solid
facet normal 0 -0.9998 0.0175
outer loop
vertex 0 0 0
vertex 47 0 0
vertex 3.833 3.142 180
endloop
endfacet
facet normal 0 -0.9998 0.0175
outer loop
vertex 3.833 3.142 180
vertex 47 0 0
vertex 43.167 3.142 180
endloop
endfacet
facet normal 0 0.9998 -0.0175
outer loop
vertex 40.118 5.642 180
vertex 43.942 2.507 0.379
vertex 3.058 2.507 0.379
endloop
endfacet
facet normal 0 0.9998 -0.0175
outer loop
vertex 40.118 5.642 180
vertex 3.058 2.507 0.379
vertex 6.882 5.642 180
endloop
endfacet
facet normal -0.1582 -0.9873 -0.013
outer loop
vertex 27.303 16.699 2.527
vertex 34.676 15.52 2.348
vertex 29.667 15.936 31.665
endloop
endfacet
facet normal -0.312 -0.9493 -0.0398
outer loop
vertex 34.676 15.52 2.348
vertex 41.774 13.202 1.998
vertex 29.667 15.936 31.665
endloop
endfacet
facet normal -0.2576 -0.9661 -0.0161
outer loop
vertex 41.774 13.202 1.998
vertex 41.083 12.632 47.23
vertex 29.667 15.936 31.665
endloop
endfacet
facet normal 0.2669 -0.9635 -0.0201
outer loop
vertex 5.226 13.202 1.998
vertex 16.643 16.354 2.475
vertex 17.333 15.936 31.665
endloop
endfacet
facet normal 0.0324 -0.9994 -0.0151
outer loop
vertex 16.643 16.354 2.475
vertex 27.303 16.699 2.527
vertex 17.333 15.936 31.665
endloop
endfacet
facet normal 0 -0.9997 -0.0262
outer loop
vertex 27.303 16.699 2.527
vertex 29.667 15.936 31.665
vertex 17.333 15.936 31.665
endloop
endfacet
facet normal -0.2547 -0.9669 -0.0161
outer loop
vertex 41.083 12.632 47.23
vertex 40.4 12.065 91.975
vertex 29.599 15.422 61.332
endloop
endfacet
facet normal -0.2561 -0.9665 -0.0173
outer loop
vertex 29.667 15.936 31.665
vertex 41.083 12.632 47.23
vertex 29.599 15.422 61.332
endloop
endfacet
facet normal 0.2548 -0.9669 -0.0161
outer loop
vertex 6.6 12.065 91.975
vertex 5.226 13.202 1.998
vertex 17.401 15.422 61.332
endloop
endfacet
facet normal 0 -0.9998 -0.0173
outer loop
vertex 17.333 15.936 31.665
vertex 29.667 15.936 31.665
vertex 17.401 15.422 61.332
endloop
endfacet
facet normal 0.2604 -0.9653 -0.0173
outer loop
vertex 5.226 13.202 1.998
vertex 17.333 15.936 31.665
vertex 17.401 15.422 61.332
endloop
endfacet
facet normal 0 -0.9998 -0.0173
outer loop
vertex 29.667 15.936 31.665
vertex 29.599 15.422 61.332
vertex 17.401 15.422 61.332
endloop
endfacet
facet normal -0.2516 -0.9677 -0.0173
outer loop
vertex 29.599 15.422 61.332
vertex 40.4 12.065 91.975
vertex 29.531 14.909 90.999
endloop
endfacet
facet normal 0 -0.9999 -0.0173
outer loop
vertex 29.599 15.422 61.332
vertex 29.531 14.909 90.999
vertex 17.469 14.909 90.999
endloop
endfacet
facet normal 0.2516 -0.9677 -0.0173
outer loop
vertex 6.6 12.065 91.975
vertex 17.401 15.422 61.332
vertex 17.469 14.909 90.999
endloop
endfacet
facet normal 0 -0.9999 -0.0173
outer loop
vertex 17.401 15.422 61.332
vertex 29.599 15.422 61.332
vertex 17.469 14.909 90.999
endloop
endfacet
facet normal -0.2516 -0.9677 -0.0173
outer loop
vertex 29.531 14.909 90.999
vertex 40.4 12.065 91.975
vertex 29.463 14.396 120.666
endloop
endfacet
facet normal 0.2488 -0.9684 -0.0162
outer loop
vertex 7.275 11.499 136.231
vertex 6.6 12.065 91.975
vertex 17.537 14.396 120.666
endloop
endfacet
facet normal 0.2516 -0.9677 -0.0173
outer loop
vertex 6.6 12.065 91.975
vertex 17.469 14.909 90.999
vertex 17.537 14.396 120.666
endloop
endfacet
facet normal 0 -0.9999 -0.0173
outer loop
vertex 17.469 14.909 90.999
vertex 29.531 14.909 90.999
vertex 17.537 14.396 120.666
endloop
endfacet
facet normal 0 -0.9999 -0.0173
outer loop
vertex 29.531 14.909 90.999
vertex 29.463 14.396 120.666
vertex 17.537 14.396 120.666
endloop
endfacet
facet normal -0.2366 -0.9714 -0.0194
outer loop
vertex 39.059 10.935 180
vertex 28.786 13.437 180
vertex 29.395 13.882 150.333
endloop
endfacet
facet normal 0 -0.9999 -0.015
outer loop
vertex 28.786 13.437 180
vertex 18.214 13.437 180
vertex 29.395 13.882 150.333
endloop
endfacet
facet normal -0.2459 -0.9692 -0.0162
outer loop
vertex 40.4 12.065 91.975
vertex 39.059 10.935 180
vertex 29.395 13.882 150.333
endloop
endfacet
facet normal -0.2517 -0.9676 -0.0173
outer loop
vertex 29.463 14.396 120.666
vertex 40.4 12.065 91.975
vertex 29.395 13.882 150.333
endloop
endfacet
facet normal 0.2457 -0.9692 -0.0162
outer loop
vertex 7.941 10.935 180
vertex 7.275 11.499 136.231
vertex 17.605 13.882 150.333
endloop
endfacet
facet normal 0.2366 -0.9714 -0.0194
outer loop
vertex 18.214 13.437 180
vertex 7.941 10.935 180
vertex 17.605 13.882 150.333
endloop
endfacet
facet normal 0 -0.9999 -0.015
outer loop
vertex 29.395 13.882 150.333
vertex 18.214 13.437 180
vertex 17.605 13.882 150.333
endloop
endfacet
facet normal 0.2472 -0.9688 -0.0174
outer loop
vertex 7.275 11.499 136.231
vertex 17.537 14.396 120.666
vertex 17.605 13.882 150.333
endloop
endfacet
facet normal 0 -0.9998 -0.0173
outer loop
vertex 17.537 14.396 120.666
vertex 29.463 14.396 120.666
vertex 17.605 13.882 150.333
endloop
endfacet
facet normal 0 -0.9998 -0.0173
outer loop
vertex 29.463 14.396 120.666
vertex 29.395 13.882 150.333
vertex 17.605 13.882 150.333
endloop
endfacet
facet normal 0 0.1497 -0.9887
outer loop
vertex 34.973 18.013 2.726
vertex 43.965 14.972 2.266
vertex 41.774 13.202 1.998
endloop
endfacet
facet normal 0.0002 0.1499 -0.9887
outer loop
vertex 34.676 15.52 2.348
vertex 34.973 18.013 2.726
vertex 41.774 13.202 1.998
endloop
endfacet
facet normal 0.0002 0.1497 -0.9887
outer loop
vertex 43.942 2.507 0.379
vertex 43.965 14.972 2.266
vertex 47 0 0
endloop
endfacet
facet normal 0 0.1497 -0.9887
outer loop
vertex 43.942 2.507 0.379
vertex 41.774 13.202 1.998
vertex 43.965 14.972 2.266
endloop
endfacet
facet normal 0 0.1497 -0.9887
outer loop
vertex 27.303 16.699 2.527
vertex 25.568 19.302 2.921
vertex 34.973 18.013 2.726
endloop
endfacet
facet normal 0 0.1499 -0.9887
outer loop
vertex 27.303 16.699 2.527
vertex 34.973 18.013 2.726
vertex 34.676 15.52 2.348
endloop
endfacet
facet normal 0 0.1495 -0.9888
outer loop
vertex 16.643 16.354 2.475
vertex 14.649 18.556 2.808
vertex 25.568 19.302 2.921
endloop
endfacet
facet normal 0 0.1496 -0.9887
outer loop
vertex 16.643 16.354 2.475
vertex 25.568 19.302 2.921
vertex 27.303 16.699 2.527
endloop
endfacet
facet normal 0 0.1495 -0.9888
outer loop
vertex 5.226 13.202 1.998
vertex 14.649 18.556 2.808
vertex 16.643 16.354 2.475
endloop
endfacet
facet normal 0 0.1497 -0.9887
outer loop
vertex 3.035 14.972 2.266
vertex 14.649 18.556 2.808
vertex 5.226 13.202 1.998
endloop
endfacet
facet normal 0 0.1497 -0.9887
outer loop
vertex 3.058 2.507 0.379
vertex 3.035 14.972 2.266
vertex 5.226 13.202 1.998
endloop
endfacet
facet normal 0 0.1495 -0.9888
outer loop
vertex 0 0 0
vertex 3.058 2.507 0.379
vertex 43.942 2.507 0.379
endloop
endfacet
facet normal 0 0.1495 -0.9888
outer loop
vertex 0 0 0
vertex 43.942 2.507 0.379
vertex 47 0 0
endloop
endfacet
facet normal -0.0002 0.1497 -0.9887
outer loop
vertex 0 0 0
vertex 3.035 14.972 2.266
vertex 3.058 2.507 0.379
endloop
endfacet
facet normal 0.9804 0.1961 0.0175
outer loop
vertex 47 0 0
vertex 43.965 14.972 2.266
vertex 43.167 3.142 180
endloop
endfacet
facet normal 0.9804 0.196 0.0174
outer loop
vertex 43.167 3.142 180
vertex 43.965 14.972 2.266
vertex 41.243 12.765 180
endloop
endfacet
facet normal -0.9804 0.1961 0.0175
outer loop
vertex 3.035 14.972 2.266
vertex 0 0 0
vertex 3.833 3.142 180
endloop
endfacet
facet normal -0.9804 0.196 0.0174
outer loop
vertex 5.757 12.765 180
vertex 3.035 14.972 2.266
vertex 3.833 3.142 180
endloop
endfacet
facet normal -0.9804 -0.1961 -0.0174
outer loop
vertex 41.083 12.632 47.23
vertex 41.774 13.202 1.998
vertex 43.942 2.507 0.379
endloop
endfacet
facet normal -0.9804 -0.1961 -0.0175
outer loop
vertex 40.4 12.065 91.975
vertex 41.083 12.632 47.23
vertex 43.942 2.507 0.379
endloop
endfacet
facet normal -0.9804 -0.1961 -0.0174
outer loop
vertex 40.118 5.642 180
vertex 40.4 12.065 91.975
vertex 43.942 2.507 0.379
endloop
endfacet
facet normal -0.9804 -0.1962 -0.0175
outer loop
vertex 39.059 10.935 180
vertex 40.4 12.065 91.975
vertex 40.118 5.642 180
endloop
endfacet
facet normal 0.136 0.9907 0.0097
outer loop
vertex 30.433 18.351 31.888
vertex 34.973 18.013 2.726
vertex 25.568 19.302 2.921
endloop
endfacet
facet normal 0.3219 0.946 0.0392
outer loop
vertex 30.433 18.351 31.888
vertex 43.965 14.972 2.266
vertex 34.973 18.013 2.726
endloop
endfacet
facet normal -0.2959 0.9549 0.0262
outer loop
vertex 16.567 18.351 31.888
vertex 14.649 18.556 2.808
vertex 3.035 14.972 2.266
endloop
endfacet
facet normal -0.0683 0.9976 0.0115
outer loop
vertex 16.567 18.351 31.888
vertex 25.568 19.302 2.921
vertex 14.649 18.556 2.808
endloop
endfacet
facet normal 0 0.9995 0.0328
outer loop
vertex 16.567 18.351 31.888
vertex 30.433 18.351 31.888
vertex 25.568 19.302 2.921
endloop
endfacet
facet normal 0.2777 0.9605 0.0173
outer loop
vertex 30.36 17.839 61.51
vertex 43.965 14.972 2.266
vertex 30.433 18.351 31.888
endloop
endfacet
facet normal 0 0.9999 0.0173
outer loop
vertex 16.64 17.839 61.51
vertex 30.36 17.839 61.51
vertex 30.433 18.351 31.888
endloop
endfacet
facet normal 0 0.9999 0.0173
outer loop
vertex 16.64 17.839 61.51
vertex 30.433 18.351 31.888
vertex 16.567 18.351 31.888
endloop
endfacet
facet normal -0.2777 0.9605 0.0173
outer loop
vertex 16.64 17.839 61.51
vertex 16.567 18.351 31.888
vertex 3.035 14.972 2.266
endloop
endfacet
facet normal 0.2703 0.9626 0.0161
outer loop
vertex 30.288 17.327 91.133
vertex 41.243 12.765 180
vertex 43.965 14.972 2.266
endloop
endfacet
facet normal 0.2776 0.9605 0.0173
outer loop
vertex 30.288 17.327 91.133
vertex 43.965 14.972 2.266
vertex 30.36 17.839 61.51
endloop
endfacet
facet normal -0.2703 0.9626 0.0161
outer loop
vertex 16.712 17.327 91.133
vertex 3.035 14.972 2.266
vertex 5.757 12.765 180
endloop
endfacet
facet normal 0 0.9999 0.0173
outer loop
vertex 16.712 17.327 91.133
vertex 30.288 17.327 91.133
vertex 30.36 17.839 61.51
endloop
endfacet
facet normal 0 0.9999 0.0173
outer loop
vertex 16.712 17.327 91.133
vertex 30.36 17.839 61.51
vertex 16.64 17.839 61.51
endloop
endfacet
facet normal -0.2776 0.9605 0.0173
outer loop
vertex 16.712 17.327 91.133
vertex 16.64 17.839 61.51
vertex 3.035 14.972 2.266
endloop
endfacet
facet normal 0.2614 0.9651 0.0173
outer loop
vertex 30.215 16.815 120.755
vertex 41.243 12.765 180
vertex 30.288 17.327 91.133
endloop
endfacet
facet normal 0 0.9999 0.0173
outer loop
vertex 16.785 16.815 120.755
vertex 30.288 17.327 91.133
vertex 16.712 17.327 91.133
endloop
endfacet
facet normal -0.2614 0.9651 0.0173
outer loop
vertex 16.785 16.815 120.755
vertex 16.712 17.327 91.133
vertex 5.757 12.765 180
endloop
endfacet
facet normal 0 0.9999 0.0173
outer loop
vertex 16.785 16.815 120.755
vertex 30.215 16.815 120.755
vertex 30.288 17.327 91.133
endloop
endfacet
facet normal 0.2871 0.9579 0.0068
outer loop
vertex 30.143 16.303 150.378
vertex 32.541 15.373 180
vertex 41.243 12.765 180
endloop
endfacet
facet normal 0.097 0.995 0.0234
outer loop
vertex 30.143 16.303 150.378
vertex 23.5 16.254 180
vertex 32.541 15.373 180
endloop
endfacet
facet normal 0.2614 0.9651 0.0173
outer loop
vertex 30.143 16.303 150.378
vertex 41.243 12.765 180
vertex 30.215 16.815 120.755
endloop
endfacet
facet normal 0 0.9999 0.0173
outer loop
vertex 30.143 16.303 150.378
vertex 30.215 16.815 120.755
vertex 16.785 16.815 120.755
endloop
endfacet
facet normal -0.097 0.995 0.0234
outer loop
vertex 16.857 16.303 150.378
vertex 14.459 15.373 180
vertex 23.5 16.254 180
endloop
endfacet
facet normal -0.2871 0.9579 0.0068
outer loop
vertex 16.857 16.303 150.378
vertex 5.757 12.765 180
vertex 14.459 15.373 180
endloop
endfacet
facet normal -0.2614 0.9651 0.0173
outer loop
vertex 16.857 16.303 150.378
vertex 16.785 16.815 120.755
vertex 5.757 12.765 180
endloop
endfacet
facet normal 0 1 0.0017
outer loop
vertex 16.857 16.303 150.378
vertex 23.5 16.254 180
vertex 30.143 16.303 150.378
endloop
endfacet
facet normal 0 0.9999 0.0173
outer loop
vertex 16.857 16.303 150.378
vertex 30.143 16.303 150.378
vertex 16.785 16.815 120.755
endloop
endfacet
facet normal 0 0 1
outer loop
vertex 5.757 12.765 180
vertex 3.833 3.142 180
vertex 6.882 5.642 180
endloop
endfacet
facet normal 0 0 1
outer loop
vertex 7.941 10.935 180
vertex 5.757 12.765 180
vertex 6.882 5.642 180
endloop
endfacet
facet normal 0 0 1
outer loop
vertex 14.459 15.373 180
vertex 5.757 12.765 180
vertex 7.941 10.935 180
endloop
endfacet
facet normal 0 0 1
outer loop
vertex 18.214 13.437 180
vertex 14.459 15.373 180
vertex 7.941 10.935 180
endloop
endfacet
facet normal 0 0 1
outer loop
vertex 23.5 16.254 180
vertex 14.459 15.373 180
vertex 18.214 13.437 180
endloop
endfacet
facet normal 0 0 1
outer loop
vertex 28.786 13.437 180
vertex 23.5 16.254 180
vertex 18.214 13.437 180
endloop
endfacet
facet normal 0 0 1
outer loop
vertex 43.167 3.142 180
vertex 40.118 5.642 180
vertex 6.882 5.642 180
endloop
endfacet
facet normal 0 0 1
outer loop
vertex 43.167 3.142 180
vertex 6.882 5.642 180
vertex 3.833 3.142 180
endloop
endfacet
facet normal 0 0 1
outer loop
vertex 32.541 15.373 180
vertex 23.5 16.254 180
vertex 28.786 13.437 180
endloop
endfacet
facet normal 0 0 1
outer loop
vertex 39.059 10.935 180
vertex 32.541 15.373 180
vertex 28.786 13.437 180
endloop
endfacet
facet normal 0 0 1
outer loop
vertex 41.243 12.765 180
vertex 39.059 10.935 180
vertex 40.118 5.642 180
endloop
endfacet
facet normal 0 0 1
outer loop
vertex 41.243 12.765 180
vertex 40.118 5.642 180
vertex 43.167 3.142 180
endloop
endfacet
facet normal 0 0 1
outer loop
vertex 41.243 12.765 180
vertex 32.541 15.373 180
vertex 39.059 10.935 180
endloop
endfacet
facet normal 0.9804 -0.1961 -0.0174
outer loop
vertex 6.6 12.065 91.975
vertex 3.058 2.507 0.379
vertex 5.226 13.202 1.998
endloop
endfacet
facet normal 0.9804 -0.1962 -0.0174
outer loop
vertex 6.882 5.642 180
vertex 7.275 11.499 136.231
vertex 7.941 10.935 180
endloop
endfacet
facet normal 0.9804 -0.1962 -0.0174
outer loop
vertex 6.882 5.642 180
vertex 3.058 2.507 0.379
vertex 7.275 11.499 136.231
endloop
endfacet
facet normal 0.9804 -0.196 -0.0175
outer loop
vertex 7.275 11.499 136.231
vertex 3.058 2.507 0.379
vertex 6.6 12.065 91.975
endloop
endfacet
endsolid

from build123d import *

# Parameters (mm, degrees)
F0_DEPTH = 180
F0_TAPER = 1
F2_DEPTH = 100
F4_T     = -2.5


with BuildPart() as f0:
    # F3 (on Top) → F0 (new body)
    with BuildSketch(Plane.XY):
        with BuildLine():
            Line((3, 15), (0, 0))
            Line((0, 0), (47, 0))
            Line((47, 0), (44, 15))
            ThreePointArc((44, 15), (23.5, 19.3957238847), (3, 15))
        make_face()
    extrude(amount=F0_DEPTH, taper=F0_TAPER)

    # F1 (on Right) → F2 (cut)
    with BuildSketch(Plane.YZ):
        Polygon((25.968901813, 3.9296671748), (0, 0), (-2.0501518156, -6.7397900857), (27.46424824, -6.7397900857), (27.54820722, -6.5070505478), align=None)
    extrude(amount=F2_DEPTH, mode=Mode.SUBTRACT)

    # F4
    f4_openings = [f0.faces().sort_by_distance(p)[0] for p in [
        (23.5, 8.769434, 1.327009),
        (23.5, 9.052127, 180),
    ]]
    offset(amount=F4_T, openings=f4_openings, kind=Kind.INTERSECTION)


solid = f0.part
